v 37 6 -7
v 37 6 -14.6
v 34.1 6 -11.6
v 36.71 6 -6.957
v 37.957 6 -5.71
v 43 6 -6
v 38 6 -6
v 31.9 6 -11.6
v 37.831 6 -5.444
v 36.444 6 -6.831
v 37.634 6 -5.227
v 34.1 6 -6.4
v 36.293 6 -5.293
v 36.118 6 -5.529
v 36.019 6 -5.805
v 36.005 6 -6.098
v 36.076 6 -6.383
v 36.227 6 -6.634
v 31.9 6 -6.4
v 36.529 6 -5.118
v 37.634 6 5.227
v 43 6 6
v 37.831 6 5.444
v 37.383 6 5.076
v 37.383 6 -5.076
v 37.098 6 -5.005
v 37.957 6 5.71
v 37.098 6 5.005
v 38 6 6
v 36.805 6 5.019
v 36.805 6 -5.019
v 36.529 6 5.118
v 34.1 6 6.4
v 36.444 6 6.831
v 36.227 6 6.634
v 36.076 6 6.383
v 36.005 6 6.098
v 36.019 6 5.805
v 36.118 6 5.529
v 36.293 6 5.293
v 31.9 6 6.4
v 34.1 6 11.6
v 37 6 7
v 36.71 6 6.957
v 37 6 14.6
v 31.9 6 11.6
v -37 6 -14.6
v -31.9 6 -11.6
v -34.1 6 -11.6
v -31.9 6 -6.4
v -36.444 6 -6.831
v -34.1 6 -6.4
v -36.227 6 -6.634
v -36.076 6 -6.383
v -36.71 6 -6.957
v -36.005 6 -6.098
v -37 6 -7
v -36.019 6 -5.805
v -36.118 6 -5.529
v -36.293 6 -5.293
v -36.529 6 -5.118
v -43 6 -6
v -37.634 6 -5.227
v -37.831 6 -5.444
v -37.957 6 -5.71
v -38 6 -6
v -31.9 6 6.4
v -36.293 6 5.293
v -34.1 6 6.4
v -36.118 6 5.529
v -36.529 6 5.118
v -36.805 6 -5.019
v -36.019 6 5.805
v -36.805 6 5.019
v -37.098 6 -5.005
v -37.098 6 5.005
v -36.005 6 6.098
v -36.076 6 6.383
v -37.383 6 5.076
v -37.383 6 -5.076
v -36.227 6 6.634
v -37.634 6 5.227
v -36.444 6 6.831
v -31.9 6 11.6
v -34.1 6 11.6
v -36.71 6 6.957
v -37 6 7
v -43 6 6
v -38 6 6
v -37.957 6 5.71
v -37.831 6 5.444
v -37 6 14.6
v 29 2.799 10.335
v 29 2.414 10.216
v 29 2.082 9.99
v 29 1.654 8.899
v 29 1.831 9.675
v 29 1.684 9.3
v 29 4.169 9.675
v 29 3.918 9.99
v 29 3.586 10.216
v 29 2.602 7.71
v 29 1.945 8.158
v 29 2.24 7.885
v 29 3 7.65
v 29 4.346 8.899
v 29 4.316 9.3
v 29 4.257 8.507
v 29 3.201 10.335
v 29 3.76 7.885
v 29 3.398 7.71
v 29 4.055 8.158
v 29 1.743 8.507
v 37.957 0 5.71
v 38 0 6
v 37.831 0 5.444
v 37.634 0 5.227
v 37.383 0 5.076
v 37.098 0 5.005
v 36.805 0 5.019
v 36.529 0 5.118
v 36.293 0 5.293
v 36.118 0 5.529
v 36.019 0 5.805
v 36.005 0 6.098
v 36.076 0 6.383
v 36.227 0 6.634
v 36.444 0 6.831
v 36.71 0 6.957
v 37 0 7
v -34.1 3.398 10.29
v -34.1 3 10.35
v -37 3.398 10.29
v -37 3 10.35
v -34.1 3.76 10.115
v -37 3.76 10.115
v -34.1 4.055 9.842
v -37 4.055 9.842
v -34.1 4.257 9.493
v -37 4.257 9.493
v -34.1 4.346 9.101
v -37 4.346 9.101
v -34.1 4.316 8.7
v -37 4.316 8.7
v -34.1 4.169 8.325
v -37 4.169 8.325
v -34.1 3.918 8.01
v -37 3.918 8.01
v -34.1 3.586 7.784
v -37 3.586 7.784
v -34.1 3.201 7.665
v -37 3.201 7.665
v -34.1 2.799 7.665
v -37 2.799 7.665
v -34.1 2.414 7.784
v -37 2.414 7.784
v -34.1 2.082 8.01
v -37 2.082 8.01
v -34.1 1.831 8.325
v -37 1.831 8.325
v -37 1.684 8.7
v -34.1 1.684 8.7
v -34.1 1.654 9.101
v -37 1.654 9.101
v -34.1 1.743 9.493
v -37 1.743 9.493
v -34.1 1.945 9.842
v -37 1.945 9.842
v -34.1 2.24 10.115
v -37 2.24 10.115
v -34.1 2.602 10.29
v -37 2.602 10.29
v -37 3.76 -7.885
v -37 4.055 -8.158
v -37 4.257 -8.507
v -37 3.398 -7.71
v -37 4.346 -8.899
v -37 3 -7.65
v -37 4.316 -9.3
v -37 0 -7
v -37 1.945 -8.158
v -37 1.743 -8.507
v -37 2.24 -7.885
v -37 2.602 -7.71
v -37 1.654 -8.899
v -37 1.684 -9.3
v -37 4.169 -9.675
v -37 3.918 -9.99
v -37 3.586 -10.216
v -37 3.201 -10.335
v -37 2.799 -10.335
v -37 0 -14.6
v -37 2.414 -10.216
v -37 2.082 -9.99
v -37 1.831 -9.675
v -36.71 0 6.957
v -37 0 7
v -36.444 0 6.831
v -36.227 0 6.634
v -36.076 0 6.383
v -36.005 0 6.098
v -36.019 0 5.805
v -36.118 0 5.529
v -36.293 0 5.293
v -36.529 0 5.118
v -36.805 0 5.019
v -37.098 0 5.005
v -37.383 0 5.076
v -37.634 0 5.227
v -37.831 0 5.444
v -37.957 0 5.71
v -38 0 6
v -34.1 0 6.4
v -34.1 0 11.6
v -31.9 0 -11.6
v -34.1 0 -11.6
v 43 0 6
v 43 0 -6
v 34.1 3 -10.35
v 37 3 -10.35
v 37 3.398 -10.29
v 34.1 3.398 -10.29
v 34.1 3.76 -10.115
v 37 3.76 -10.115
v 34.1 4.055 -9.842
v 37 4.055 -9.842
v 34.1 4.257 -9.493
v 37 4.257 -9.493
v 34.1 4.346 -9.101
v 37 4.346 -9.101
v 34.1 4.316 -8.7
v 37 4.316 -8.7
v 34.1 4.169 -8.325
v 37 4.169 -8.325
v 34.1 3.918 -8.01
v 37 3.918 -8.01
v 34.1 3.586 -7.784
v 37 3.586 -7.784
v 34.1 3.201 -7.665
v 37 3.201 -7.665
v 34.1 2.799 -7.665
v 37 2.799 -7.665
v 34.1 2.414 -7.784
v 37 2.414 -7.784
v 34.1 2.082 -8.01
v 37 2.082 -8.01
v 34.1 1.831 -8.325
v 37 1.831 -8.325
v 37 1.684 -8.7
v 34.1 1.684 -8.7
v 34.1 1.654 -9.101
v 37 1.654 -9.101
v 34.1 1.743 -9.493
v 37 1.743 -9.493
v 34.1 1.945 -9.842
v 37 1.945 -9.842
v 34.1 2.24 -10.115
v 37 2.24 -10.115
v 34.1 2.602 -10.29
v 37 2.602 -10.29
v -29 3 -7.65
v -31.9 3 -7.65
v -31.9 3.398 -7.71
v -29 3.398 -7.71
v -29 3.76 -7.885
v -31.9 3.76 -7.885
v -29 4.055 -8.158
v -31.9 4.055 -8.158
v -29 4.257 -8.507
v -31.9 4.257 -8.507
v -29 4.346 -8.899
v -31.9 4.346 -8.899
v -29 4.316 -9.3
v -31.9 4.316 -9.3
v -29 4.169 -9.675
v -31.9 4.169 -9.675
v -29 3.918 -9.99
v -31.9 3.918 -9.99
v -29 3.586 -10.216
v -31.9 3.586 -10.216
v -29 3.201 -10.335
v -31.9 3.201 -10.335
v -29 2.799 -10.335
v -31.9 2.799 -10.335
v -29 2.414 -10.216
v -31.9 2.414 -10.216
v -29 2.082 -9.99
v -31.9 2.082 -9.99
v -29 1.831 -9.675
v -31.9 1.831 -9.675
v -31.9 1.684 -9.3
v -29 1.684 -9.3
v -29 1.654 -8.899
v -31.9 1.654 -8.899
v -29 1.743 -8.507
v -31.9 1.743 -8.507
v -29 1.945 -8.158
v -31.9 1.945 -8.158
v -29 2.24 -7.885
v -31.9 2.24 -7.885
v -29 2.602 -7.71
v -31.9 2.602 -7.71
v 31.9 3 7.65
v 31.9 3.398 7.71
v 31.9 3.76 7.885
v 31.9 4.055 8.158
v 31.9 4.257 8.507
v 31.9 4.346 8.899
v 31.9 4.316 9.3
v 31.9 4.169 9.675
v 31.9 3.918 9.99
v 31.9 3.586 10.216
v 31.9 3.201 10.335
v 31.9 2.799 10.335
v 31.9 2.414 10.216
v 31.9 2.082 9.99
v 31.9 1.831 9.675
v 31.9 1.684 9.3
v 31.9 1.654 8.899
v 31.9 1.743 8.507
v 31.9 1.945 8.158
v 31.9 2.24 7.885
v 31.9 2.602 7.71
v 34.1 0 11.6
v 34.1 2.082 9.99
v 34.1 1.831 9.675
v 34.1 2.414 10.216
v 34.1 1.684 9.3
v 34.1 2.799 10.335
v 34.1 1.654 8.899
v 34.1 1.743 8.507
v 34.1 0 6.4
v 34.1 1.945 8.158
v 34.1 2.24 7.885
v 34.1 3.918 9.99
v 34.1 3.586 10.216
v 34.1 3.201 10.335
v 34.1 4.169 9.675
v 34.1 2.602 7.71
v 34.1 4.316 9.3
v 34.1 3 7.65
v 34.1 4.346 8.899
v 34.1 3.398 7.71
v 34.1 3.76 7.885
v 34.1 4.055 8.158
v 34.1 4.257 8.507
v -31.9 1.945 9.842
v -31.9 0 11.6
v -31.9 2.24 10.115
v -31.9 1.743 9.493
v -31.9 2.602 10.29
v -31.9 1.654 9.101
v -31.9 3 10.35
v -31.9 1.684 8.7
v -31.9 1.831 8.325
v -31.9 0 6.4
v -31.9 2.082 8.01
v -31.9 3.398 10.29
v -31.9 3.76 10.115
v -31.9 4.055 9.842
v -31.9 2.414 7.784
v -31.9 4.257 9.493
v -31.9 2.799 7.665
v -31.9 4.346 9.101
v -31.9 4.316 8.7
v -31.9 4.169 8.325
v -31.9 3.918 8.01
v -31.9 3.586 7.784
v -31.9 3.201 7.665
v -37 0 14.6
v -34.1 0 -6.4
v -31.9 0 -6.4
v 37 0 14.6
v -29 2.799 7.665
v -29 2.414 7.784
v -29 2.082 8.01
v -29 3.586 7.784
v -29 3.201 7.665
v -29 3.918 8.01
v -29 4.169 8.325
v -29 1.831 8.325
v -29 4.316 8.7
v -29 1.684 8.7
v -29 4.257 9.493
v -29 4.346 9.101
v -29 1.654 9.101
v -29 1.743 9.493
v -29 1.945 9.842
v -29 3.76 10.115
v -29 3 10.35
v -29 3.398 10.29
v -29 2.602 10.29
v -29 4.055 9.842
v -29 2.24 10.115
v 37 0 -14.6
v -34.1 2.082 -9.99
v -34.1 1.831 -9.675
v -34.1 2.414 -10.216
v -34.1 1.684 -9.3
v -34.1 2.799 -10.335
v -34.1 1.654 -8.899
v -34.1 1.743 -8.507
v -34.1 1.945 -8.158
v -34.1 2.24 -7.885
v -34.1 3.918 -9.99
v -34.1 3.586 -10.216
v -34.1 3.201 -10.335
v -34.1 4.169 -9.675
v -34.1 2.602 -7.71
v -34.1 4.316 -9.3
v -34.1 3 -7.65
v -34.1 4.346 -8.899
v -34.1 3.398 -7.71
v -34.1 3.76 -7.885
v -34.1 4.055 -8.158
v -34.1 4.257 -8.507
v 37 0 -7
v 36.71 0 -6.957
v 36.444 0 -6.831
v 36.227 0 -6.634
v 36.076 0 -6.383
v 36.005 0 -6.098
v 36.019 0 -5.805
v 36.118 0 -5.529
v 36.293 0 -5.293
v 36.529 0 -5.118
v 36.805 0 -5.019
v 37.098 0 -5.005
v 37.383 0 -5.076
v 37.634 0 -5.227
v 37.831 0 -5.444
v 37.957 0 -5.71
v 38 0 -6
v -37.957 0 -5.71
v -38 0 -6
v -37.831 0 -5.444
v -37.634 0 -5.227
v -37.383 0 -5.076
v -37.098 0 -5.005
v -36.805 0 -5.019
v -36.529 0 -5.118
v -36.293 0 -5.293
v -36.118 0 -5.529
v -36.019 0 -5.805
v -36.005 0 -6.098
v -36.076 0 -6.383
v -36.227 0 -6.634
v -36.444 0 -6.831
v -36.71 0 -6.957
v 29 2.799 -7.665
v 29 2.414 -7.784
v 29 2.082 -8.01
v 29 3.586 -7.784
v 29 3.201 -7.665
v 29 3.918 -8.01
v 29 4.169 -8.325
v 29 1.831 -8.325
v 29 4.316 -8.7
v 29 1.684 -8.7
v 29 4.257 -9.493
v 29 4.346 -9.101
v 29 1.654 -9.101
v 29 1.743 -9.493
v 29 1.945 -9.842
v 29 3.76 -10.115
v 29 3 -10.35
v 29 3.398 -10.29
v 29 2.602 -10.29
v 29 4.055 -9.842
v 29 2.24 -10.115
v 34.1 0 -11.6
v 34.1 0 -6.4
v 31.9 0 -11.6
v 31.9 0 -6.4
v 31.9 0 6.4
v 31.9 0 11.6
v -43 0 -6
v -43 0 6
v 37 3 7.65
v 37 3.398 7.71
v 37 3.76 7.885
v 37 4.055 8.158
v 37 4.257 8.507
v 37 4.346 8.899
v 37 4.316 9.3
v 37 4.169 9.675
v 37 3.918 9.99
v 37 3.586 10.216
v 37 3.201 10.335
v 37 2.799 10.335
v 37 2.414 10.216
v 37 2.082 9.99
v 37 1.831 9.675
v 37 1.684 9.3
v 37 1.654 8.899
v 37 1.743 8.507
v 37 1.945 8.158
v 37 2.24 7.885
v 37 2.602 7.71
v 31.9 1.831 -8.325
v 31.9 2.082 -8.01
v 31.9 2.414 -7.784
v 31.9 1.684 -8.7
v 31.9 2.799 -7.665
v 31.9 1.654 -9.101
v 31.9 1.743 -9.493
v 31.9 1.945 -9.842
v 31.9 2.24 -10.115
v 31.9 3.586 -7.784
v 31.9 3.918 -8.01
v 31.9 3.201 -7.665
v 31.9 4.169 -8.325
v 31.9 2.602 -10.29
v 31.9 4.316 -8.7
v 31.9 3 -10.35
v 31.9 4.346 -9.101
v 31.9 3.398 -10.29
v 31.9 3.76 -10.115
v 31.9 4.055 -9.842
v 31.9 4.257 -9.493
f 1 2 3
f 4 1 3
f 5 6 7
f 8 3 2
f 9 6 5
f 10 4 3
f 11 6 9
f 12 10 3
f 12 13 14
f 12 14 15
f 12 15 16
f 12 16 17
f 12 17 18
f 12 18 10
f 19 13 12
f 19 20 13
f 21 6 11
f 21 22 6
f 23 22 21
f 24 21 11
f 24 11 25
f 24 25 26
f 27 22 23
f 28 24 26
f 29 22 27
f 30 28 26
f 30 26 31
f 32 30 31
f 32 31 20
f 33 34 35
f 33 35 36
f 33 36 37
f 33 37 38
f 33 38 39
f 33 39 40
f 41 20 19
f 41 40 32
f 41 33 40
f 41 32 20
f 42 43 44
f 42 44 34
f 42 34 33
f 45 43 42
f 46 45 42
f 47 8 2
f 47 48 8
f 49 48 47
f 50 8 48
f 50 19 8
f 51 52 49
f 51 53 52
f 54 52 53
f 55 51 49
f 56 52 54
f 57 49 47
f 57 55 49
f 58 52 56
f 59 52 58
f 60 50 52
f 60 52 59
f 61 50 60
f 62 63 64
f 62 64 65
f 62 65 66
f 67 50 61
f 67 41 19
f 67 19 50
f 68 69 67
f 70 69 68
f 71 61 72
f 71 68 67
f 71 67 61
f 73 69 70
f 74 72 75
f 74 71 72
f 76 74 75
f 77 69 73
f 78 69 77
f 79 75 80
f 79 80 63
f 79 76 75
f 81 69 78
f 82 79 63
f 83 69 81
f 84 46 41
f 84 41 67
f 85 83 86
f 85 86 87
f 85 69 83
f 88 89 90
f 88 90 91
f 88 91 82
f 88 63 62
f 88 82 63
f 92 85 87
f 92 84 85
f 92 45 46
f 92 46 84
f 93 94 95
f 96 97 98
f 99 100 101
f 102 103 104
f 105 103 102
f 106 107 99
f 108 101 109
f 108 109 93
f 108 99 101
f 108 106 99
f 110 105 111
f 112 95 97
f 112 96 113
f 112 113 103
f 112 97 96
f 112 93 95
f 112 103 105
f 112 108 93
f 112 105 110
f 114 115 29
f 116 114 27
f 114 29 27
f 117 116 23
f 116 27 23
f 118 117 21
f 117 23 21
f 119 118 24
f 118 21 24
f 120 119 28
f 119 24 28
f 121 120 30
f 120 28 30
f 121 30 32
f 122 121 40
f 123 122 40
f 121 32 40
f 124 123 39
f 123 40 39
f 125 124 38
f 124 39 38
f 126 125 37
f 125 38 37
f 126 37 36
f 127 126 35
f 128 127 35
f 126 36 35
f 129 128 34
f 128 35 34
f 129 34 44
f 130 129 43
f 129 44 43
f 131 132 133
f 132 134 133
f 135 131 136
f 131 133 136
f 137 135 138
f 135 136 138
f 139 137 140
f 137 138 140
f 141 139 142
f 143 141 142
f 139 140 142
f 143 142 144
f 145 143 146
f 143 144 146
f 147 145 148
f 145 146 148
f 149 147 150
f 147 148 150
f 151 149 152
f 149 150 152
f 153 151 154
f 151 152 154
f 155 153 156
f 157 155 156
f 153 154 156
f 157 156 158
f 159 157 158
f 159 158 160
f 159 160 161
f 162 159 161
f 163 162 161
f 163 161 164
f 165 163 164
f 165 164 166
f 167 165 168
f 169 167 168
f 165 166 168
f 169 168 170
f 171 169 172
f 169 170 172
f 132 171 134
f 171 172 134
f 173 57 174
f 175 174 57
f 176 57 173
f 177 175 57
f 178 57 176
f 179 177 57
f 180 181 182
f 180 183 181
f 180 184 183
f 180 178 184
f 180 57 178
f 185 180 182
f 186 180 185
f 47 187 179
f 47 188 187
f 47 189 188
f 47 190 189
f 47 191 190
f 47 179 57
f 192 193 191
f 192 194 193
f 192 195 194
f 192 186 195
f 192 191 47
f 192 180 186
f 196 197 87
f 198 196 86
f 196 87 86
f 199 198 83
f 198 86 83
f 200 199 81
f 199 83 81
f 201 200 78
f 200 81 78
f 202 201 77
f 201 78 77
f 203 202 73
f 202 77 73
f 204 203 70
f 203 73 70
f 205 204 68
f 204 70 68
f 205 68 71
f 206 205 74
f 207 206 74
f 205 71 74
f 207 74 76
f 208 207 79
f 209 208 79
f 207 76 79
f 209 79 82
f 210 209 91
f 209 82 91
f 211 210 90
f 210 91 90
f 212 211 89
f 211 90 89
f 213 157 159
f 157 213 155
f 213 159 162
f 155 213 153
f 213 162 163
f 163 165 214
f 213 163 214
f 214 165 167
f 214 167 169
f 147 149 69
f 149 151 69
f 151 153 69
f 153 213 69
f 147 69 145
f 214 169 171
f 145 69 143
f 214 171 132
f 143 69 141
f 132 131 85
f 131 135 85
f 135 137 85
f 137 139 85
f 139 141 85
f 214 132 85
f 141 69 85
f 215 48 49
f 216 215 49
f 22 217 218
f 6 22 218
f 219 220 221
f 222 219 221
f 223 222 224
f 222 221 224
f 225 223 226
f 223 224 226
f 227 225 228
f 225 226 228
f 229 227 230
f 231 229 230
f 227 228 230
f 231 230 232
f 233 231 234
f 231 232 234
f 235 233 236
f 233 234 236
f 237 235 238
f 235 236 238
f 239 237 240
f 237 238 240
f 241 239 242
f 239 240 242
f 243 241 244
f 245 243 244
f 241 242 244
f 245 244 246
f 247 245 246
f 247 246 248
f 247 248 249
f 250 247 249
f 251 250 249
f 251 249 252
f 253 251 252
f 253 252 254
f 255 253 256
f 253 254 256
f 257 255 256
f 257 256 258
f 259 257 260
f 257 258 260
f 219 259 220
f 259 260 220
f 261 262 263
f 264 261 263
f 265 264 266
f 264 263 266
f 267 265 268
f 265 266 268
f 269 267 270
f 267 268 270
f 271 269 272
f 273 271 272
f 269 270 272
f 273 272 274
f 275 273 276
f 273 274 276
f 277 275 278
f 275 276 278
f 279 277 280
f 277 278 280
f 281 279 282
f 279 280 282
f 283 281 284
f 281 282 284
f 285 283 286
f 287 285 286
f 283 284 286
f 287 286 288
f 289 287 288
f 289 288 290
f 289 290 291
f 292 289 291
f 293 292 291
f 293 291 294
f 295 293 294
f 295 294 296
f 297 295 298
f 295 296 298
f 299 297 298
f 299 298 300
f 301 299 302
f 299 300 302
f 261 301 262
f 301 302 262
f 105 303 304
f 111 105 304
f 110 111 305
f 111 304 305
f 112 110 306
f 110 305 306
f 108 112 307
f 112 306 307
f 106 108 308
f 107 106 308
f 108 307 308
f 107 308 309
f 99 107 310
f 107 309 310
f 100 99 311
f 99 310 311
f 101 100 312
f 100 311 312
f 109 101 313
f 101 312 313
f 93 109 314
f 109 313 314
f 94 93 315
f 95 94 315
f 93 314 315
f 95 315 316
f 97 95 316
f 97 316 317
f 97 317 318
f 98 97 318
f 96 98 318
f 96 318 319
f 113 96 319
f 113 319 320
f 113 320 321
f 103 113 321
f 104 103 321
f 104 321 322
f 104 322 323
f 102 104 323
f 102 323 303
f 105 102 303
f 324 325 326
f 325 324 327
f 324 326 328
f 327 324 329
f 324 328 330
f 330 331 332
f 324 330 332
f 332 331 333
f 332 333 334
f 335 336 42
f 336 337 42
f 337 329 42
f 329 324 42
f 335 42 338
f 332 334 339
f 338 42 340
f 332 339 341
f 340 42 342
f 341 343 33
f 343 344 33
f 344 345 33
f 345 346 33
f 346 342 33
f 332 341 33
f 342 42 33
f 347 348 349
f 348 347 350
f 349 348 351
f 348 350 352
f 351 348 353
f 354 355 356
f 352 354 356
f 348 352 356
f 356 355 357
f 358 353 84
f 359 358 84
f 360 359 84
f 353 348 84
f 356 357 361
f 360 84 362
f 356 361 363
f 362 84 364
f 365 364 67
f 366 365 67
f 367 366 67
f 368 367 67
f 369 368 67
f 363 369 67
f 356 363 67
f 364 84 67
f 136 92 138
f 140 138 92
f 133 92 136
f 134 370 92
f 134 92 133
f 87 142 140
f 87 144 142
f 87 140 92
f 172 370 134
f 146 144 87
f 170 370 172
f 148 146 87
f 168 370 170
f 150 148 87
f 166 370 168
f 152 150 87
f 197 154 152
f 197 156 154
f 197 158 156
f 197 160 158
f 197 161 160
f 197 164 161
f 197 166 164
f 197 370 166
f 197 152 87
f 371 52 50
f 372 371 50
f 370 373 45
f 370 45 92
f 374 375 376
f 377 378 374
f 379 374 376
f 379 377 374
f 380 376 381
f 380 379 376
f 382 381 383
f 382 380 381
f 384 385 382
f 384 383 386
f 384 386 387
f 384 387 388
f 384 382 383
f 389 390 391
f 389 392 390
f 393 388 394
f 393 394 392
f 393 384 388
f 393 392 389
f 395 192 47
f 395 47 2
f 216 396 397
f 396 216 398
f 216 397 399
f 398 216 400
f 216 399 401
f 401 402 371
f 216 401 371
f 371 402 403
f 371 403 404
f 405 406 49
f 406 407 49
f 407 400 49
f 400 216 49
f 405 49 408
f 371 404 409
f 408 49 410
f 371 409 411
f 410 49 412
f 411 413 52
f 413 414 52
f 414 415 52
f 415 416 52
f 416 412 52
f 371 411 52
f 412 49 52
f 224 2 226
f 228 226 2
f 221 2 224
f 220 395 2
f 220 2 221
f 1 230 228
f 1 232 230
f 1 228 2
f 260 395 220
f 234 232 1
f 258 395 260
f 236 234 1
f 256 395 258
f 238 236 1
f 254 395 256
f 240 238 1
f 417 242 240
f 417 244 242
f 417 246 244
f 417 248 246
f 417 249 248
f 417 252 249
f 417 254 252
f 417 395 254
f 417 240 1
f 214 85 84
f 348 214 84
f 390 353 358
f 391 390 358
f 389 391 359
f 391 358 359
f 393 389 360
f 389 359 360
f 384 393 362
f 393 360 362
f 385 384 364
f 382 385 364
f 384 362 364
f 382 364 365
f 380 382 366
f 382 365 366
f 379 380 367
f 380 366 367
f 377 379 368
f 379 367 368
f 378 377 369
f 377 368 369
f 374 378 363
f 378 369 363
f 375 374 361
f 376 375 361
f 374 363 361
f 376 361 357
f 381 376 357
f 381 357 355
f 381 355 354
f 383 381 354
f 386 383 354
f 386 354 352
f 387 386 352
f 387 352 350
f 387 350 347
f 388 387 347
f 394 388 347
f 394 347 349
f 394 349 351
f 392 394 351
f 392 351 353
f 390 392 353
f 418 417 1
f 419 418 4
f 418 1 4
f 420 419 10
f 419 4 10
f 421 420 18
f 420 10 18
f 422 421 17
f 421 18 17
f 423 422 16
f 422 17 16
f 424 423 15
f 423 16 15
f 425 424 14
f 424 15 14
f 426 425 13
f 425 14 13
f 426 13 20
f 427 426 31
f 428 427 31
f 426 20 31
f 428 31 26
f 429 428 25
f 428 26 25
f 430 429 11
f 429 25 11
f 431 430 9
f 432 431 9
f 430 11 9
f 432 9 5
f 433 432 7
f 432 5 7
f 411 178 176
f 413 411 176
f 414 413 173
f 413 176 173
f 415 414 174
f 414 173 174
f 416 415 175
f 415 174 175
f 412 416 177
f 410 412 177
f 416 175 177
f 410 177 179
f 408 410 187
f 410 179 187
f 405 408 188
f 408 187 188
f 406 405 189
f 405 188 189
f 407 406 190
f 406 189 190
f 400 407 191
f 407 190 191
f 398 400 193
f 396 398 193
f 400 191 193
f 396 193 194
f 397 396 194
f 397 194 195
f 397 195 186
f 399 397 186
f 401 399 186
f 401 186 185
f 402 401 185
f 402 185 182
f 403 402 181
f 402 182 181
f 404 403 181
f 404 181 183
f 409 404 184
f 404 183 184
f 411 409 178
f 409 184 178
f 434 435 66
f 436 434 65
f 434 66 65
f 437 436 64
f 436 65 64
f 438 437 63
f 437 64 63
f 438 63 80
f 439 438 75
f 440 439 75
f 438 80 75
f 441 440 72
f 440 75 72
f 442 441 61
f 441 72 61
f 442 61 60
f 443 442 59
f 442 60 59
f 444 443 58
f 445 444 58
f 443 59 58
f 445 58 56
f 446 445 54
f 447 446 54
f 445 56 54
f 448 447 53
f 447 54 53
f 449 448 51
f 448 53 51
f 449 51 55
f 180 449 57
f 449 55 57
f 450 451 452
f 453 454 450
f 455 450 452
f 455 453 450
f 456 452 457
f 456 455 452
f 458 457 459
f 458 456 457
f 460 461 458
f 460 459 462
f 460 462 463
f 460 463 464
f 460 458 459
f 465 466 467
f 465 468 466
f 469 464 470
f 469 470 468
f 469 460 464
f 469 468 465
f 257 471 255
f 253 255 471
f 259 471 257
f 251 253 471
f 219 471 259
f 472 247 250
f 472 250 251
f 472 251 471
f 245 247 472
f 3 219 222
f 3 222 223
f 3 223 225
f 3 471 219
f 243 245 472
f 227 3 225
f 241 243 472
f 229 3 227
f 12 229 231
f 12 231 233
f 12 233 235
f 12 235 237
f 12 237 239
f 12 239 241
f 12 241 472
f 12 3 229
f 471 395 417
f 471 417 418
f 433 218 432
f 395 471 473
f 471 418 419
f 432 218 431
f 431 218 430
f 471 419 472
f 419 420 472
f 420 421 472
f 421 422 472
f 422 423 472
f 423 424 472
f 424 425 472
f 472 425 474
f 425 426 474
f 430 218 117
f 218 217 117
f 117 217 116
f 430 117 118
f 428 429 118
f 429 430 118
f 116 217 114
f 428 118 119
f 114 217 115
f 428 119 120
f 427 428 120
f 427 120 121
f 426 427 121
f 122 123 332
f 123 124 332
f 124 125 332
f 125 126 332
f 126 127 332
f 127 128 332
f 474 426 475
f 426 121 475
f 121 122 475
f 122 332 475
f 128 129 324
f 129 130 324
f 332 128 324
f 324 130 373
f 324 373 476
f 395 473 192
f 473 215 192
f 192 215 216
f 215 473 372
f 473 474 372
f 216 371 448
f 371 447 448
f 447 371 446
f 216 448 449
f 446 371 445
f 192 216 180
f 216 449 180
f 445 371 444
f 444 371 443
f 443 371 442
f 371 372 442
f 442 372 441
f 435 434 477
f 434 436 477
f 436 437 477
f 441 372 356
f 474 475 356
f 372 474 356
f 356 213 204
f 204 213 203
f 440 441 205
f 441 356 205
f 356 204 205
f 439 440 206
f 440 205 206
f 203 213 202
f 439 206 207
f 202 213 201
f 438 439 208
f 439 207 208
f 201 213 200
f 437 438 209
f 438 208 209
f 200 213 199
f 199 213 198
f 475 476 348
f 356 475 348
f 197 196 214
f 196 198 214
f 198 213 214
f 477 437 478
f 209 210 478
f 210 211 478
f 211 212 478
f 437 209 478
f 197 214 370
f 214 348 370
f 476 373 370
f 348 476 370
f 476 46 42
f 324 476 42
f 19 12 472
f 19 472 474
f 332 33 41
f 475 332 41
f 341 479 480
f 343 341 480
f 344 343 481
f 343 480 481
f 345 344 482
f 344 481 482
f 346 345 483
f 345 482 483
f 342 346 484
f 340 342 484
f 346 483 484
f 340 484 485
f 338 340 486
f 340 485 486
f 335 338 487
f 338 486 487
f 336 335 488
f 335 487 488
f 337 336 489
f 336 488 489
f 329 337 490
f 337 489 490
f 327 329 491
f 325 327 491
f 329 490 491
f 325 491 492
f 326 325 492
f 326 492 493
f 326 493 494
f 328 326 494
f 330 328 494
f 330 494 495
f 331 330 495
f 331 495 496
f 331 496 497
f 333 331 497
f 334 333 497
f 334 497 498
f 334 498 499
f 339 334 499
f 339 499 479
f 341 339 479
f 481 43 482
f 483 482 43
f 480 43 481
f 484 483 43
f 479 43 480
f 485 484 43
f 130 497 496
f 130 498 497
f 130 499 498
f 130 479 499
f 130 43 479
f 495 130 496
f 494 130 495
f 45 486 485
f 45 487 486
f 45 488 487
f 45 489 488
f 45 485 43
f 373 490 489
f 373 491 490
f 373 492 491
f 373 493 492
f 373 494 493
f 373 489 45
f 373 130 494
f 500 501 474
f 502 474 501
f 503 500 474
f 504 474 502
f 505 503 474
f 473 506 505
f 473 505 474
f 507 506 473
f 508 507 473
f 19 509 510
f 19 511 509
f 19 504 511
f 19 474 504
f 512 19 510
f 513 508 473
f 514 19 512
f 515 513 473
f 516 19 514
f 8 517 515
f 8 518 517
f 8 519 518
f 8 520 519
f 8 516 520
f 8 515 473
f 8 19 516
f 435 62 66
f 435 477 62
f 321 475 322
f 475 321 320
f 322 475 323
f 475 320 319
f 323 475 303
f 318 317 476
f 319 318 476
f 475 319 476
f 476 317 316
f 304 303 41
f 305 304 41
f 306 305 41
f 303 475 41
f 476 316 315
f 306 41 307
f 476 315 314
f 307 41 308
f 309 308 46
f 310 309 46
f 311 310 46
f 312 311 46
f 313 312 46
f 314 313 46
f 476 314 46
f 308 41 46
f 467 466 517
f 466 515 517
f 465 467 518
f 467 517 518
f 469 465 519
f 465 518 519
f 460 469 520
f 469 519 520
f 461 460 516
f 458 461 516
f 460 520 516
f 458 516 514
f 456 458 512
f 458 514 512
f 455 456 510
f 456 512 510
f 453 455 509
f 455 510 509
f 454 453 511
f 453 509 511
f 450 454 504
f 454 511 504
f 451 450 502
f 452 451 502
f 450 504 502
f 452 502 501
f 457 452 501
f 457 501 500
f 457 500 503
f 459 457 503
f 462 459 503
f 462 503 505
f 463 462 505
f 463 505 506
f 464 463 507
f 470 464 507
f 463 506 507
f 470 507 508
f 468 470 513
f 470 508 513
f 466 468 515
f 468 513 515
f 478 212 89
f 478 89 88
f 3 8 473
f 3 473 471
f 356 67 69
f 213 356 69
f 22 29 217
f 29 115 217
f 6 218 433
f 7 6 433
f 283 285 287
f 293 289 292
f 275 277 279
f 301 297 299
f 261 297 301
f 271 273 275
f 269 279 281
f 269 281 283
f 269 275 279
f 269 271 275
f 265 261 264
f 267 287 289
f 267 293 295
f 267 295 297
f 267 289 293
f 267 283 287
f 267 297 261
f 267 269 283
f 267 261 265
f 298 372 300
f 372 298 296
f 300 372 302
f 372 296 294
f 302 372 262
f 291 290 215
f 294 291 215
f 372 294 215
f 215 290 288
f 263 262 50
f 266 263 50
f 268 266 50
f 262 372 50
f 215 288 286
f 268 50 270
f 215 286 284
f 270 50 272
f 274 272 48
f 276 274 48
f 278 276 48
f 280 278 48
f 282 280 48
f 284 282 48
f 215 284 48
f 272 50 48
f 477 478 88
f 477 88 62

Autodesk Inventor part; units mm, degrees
ref_plane "우측면도" through (0, 0, 0) normal (1, 0, 0) x (0, 1, 0)
ref_plane "평면도" through (0, 0, 0) normal (0, 1, 0) x (-1, 0, 0)
ref_plane "정면도" through (0, 0, 0) normal (0, 0, 1) x (1, 0, 0)
sketch "스케치1" plane through (0, 0, 0) normal (0, 1, 0) x (-1, 0, 0)
  line L0 (-37, 14.6) -> (37, 14.6)
  line L1 (37, 14.6) -> (37, -14.6)
  line L2 (37, -14.6) -> (-37, -14.6)
  line L3 (-37, -14.6) -> (-37, 14.6)
  line L4 (-37, 14.6) -> (37, -14.6) construction
  line L5 (37, 14.6) -> (-37, -14.6) construction
  line L6 (37, 6) -> (43, 6)
  line L7 (43, 6) -> (43, -6)
  line L8 (43, -6) -> (37, -6)
  line L9 (37, -6) -> (37, 6)
  line L10 (-37, 6) -> (-43, 6)
  line L11 (-43, 6) -> (-43, -6)
  line L12 (-43, -6) -> (-37, -6)
  line L13 (-37, -6) -> (-37, 6)
  point P0 (0, 0)
  dimension "d0" = 74
  dimension "d1" = 29.2
  dimension "d2" = 6
  dimension "d3" = 12
  dimension "d4" = 6
  dimension "d5" = 12
extrude "돌출1" add sketch "스케치1" along normal blind 6
sketch "스케치2" plane through (43, 0, 6) normal (1, 0, 0) x (0, 0, -1)
  line L0 (12, 0) -> (20.6, 0) projected
  line L1 (20.6, 0) -> (20.6, 6) projected
  line L2 (12, 6) -> (20.6, 6) projected
  line L3 (12, 0) -> (12, 6) projected
  line L4 (-8.6, 0) -> (0, 0) projected
  line L5 (0, 0) -> (0, 6) projected
  line L6 (-8.6, 6) -> (0, 6) projected
  line L7 (-8.6, 0) -> (-8.6, 6) projected
  circle A0 centre (15, 3) radius 1.35
  circle A1 centre (-3, 3) radius 1.35
  point P0 (6, 0)
  dimension "d8" = 2.7
  dimension "d9" = 2.7
extrude "돌출2" cut sketch "스케치2" against normal blind 14 contours A0 | A1
sketch "스케치3" plane through (-43, 0, -6) normal (-1, 0, 0) x (0, 0, 1)
  line L0 (12, 0) -> (20.6, 0) projected
  line L1 (20.6, 0) -> (20.6, 6) projected
  line L2 (12, 6) -> (20.6, 6) projected
  line L3 (12, 0) -> (12, 6) projected
  circle A0 centre (-3, 3) radius 1.35 projected
  line L4 (-8.6, 0) -> (0, 0) projected
  line L5 (0, 0) -> (0, 6) projected
  line L6 (-8.6, 6) -> (0, 6) projected
  line L7 (-8.6, 0) -> (-8.6, 6) projected
  circle A1 centre (15, 3) radius 1.35 projected
  circle A2 centre (-3, 3) radius 1.35
  circle A3 centre (15, 3) radius 1.35
  point P0 (6, 0)
extrude "돌출3" cut sketch "스케치3" against normal blind 14 contours A0 | A1
sketch "스케치4" plane through (0, 6, 0) normal (0, 1, 0) x (1, 0, 0)
  line L0 (37, -14.6) -> (37, -6) projected
  line L1 (37, -6) -> (43, -6) projected
  line L2 (43, -6) -> (43, 6) projected
  line L3 (43, 6) -> (37, 6) projected
  line L4 (37, 6) -> (37, 14.6) projected
  line L5 (37, 14.6) -> (-37, 14.6) projected
  line L6 (-37, 14.6) -> (-37, 6) projected
  line L7 (-37, 6) -> (-43, 6) projected
  line L8 (-43, 6) -> (-43, -6) projected
  line L9 (-43, -6) -> (-37, -6) projected
  line L10 (-37, -6) -> (-37, -14.6) projected
  line L11 (-37, -14.6) -> (37, -14.6) projected
  line L12 (-37, 10.35) -> (-29, 10.35) projected
  line L13 (-37, 7.65) -> (-29, 7.65) projected
  line L14 (-33, 10.35) -> (-33, 7.65)
  line L15 (-34.1, 6.4) -> (-31.9, 6.4)
  line L16 (-31.9, 6.4) -> (-31.9, 11.6)
  line L17 (-31.9, 11.6) -> (-34.1, 11.6)
  line L18 (-34.1, 11.6) -> (-34.1, 6.4)
  line L19 (-34.1, 6.4) -> (-31.9, 11.6) construction
  line L20 (-31.9, 6.4) -> (-34.1, 11.6) construction
  line L21 (34.1, 6.4) -> (31.9, 6.4)
  line L22 (31.9, 6.4) -> (31.9, 11.6)
  line L23 (31.9, 11.6) -> (34.1, 11.6)
  line L24 (34.1, 11.6) -> (34.1, 6.4)
  line L25 (34.1, 6.4) -> (31.9, 11.6) construction
  line L26 (31.9, 6.4) -> (34.1, 11.6) construction
  line L27 (31.9, -11.6) -> (34.1, -11.6)
  line L28 (34.1, -11.6) -> (34.1, -6.4)
  line L29 (34.1, -6.4) -> (31.9, -6.4)
  line L30 (31.9, -6.4) -> (31.9, -11.6)
  line L31 (31.9, -11.6) -> (34.1, -6.4) construction
  line L32 (34.1, -11.6) -> (31.9, -6.4) construction
  line L33 (-34.1, -11.6) -> (-31.9, -11.6)
  line L34 (-31.9, -11.6) -> (-31.9, -6.4)
  line L35 (-31.9, -6.4) -> (-34.1, -6.4)
  line L36 (-34.1, -6.4) -> (-34.1, -11.6)
  line L37 (-34.1, -11.6) -> (-31.9, -6.4) construction
  line L38 (-31.9, -11.6) -> (-34.1, -6.4) construction
  point P0 (0, 0)
  point P1 (-33, 9)
  point P2 (33, 9)
  point P3 (33, -9)
  point P4 (-33, -9)
  dimension "d14" = 2.2
  dimension "d15" = 5.2
  dimension "d16" = 2.2
  dimension "d17" = 5.2
  dimension "d18" = 2.2
  dimension "d19" = 5.2
  dimension "d20" = 2.2
  dimension "d21" = 5.2
extrude "돌출4" cut sketch "스케치4" against normal blind 14 contours L18 L12 L14 L13 | L13 L16 L15 L18 | L18 L17 L16 L12 | L14 L12 L16 L13 | L21 L22 L23 L24 | L30 L29 L28 L27 | L36 L35 L34 L33
sketch "스케치5" plane through (0, 6, 0) normal (0, 1, 0) x (1, 0, 0)
  line L0 (31.9, 6.4) -> (31.9, 11.6) projected
  line L1 (31.9, 11.6) -> (34.1, 11.6) projected
  line L2 (34.1, 11.6) -> (34.1, 6.4) projected
  line L3 (34.1, 6.4) -> (31.9, 6.4) projected
  line L4 (-34.1, -6.4) -> (-31.9, -6.4) projected
  line L5 (-31.9, -6.4) -> (-31.9, -11.6) projected
  line L6 (-31.9, -11.6) -> (-34.1, -11.6) projected
  line L7 (-34.1, -11.6) -> (-34.1, -6.4) projected
  line L8 (31.9, -6.4) -> (34.1, -6.4) projected
  line L9 (34.1, -6.4) -> (34.1, -11.6) projected
  line L10 (34.1, -11.6) -> (31.9, -11.6) projected
  line L11 (31.9, -11.6) -> (31.9, -6.4) projected
  line L12 (-34.1, 6.4) -> (-34.1, 11.6) projected
  line L13 (-34.1, 11.6) -> (-31.9, 11.6) projected
  line L14 (-31.9, 11.6) -> (-31.9, 6.4) projected
  line L15 (-31.9, 6.4) -> (-34.1, 6.4) projected
  line L16 (37, -14.6) -> (37, -6) projected
  line L17 (37, -6) -> (43, -6) projected
  line L18 (43, -6) -> (43, 6) projected
  line L19 (43, 6) -> (37, 6) projected
  line L20 (37, 6) -> (37, 14.6) projected
  line L21 (37, 14.6) -> (-37, 14.6) projected
  line L22 (-37, 14.6) -> (-37, 6) projected
  line L23 (-37, 6) -> (-43, 6) projected
  line L24 (-43, 6) -> (-43, -6) projected
  line L25 (-43, -6) -> (-37, -6) projected
  line L26 (-37, -6) -> (-37, -14.6) projected
  line L27 (-37, -14.6) -> (37, -14.6) projected
  circle A0 centre (-37, -6) radius 1
  circle A1 centre (-37, 6) radius 1
  circle A2 centre (37, -6) radius 1
  circle A3 centre (37, 6) radius 1
  point P0 (0, 0)
  point P1 (-37, -7)
  point P2 (-38, -6)
  dimension "d24" = 2
  dimension "d25" = 2
  dimension "d26" = 2
  dimension "d27" = 2
extrude "돌출5" cut sketch "스케치5" against normal through all contours A2 L17 L16 | L16 L17 A2 | L26 L25 A0 | A3 L20 L19 | L19 L20 A3 | A1 L22 L23 | L23 L22 A1 picked at (-37.657, -5.9202)
properties part number "body front connection" material "PMMA 플라스틱"
